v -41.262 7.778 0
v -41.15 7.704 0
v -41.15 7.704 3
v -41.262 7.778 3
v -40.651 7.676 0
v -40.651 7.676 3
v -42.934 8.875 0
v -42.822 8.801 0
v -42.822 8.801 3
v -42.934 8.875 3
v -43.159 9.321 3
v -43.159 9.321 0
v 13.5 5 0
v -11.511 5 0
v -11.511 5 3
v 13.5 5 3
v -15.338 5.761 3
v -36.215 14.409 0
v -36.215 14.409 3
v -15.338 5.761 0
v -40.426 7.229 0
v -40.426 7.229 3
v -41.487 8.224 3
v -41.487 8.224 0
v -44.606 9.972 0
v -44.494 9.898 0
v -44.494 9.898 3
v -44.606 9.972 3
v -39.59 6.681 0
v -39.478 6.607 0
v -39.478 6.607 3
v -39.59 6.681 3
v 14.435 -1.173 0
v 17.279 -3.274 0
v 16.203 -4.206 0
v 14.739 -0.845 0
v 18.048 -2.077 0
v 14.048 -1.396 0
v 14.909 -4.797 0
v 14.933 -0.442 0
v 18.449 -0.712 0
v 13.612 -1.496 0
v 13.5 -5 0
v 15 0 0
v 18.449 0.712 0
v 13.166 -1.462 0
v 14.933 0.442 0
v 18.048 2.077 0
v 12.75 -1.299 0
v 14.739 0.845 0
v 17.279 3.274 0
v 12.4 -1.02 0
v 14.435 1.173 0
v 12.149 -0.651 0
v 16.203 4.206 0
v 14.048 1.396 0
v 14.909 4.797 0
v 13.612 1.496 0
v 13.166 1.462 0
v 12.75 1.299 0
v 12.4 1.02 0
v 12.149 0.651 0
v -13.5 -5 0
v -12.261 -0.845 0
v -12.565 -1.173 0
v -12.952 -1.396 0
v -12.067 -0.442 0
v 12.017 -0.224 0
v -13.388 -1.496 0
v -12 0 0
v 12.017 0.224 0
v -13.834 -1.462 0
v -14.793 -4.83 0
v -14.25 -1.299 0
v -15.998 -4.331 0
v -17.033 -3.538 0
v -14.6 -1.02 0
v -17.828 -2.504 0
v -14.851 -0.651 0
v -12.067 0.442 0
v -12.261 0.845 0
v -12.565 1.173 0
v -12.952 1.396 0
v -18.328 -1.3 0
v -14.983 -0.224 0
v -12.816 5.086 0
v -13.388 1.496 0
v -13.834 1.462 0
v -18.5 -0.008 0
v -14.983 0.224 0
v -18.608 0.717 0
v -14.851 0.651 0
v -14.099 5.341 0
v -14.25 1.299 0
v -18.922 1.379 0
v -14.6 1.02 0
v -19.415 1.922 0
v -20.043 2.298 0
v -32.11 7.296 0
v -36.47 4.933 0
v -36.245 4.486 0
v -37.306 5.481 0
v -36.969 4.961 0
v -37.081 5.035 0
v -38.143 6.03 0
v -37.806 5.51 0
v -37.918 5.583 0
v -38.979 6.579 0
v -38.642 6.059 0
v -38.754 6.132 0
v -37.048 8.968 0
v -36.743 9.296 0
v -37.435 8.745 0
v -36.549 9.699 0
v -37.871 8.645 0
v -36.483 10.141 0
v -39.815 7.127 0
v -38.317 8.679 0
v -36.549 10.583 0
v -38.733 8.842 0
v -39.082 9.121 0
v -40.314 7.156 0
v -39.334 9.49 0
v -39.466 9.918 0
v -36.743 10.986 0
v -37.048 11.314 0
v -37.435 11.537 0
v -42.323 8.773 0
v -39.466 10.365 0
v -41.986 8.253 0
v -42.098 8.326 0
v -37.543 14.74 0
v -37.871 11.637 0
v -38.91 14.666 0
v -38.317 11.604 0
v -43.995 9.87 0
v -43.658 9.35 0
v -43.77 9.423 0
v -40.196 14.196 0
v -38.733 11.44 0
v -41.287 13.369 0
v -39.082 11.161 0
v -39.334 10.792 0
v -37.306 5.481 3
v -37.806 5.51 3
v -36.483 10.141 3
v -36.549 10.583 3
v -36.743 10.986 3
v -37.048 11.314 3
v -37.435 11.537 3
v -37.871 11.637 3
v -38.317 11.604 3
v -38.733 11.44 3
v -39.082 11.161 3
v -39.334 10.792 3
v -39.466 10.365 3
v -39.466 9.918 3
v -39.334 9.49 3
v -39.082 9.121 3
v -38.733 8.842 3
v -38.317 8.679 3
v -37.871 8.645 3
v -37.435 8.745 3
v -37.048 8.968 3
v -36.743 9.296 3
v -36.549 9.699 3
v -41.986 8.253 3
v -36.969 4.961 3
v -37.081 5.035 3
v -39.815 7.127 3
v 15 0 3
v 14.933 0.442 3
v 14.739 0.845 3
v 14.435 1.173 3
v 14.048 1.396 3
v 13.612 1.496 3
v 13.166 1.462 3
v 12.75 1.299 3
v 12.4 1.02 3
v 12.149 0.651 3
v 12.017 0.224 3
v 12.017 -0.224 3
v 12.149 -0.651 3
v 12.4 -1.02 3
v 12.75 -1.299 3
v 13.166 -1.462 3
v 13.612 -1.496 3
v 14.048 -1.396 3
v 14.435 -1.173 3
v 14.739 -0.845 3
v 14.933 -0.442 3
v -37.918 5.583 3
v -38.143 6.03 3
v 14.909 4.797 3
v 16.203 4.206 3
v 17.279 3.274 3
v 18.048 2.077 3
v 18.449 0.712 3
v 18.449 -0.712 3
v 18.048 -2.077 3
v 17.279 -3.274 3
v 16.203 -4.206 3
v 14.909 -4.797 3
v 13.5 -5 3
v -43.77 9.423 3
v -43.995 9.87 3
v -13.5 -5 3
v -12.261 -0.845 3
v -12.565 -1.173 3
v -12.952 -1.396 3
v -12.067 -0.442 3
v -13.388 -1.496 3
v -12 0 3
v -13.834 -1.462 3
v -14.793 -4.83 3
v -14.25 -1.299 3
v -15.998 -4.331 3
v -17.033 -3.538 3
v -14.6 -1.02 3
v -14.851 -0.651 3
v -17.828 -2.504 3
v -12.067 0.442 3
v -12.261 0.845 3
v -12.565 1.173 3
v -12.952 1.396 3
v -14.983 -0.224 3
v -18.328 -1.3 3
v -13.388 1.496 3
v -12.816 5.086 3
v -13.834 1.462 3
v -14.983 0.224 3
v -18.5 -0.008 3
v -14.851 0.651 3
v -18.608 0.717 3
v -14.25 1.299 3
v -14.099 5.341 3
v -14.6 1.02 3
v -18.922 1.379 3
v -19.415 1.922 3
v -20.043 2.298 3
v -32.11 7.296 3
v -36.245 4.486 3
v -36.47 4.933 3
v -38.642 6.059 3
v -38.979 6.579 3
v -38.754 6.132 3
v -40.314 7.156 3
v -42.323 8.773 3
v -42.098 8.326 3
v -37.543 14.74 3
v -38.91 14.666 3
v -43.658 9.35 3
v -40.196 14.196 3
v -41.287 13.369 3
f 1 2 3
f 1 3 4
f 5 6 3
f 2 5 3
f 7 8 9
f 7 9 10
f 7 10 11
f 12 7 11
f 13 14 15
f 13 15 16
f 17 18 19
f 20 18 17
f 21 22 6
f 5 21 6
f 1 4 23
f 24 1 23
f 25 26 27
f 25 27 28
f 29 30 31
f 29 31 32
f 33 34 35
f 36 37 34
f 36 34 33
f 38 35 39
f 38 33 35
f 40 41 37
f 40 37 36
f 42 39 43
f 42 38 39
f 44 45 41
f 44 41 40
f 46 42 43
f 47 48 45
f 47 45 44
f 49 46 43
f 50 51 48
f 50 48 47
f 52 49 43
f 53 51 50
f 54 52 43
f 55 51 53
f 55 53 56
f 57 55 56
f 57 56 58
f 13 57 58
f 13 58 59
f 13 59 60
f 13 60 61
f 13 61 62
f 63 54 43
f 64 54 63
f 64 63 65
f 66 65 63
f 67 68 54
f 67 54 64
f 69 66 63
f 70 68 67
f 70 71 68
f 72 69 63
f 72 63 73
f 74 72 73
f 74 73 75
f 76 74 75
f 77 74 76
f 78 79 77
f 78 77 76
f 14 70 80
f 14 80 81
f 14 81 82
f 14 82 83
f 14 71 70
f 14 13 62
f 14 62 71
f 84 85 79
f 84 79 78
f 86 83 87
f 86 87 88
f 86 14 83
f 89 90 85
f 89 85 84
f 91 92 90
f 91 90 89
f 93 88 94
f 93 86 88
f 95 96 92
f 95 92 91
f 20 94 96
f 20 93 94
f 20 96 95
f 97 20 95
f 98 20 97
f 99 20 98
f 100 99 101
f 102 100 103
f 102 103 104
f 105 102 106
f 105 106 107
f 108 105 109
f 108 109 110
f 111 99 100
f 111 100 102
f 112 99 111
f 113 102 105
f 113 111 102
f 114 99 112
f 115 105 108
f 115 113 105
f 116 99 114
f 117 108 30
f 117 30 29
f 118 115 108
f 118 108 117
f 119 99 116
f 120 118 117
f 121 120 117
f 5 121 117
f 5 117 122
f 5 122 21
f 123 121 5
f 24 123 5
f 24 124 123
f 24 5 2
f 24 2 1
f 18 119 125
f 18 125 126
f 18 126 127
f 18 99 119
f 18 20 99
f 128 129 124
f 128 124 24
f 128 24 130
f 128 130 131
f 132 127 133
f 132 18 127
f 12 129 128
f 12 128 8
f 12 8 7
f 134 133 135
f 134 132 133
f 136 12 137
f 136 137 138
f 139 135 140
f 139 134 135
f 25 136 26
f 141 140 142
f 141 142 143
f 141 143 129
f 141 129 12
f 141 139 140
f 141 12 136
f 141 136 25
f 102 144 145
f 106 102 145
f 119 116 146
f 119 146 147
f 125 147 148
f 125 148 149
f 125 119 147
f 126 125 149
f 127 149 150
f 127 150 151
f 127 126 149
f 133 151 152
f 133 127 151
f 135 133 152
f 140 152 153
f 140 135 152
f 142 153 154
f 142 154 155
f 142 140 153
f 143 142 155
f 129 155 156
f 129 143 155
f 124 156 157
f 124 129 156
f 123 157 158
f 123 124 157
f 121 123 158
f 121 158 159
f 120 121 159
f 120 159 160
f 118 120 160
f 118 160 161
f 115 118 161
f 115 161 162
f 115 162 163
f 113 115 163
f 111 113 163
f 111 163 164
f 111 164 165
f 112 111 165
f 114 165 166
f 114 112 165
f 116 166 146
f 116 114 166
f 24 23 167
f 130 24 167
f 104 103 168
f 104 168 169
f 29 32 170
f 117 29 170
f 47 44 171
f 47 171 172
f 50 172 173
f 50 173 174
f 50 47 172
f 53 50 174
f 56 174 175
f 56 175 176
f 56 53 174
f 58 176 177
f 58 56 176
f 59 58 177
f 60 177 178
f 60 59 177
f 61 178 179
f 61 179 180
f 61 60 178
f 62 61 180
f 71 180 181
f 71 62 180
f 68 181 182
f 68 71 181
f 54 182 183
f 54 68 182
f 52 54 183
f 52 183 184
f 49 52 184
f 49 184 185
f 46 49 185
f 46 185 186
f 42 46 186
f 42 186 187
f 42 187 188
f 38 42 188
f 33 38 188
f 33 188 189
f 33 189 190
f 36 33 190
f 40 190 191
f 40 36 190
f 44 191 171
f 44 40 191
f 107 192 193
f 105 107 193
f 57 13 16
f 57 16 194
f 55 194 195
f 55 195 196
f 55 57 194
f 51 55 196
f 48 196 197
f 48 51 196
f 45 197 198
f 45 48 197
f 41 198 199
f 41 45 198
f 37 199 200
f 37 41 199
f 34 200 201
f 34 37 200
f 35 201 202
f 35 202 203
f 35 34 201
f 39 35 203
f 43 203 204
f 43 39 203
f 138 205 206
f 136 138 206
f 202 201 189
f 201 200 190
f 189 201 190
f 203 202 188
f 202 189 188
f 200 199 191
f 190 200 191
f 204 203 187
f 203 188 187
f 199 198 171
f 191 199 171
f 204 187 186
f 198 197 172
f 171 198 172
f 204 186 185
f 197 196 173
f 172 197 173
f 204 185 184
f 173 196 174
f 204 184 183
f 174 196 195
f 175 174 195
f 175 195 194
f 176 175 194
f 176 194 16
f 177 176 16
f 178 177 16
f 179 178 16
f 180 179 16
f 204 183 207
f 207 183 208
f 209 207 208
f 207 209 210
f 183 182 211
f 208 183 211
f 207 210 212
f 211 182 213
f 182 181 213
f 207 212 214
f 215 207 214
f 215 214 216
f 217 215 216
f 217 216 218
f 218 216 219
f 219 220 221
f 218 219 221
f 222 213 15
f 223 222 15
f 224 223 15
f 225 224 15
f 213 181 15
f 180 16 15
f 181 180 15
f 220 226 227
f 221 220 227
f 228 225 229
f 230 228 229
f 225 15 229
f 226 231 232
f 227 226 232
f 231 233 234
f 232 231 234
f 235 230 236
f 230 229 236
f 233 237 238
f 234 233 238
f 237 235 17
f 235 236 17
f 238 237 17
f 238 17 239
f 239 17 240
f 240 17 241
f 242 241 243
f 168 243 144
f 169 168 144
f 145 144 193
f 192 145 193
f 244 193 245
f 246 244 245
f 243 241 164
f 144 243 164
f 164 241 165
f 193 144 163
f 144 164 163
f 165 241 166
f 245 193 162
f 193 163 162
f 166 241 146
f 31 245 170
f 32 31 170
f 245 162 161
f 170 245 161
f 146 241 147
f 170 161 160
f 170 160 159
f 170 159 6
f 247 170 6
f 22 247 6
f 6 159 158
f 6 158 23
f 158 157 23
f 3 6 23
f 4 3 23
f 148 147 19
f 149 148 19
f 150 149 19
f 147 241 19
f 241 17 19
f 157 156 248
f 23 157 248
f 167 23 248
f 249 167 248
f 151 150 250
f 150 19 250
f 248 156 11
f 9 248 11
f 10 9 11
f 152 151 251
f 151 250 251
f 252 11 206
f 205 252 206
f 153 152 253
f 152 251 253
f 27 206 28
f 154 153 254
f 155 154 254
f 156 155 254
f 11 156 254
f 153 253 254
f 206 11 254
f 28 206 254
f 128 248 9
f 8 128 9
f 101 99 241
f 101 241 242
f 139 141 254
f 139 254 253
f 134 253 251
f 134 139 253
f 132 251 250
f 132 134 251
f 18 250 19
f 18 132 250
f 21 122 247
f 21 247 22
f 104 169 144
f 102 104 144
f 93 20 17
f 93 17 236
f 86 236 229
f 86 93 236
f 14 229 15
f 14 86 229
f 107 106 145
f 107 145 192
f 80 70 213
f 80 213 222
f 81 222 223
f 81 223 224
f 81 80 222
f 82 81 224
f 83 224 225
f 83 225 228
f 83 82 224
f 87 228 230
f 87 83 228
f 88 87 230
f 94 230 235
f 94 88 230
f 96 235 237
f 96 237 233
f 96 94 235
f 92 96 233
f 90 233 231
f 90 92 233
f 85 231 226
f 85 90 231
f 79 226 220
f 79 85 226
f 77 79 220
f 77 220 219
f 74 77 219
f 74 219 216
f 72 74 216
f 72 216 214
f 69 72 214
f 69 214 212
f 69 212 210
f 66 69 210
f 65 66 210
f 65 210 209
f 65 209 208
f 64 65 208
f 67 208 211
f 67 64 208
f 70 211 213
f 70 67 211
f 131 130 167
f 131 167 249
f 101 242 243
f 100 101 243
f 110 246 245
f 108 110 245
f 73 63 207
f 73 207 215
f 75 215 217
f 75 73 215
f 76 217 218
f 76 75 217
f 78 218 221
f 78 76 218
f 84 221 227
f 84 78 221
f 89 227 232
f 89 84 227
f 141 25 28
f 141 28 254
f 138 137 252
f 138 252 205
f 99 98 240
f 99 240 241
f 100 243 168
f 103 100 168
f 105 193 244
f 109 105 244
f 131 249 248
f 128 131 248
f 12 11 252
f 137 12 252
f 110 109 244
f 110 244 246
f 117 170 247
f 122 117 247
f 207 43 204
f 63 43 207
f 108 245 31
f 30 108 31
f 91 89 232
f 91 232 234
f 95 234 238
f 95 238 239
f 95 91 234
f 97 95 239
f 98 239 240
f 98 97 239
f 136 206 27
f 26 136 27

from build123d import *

# Parameters (mm, degrees)
SKETCH1_R            = 1.5
BOSS_EXTRUDE1_DEPTH  = 3
CUT_EXTRUDE1_DEPTH   = 23
LPATTERN1_COUNT      = 2
LPATTERN1_PITCH      = 10
LPATTERN1_COUNT_DIR2 = 10
LPATTERN1_PITCH_DIR2 = 1


with BuildPart() as part:
    # Sketch1 → Boss-Extrude1 (new body)
    with BuildSketch(Plane.XY):
        with BuildLine():
            Line((-11.510876326, 5), (13.5, 5))
            ThreePointArc((13.5, 5), (18.5, 0), (13.5, -5))
            Line((13.5, -5), (-13.5, -5))
            ThreePointArc((-13.5, -5), (-17.032859244, -3.538206546), (-18.499994281, -0.007562225))
            ThreePointArc((-18.499994281, -0.007562225), (-18.922368323, 1.379153788), (-20.043282841, 2.298355494))
            Line((-20.043282841, 2.298355494), (-32.109838269, 7.296486403))
            Line((-32.109838269, 7.296486403), (-36.245393033, 4.48629303))
            Line((-36.245393033, 4.48629303), (-44.606456533, 9.97196684))
            Line((-44.606456533, 9.97196684), (-41.286860538, 13.369433901))
            ThreePointArc((-41.286860538, 13.369433901), (-38.910252818, 14.666448531), (-36.215040659, 14.408877911))
            Line((-36.215040659, 14.408877911), (-15.33771065, 5.761204675))
            ThreePointArc((-15.33771065, 5.761204675), (-13.461779546, 5.192147196), (-11.510876326, 5))
        make_face()
        with Locations((-13.5, 0)):
            Circle(SKETCH1_R, mode=Mode.SUBTRACT)
        with Locations((13.5, 0)):
            Circle(SKETCH1_R, mode=Mode.SUBTRACT)
        with Locations((-37.982807612, 10.141110958)):
            Circle(SKETCH1_R, mode=Mode.SUBTRACT)
    extrude(amount=BOSS_EXTRUDE1_DEPTH)

    # Sketch3 → Cut-Extrude1 (cut)
    with BuildSketch(Plane.XY.offset(3)):
        Polygon((-36.470295857, 4.932856261), (-36.969482372, 4.961366317), (-36.245393033, 4.48629303), align=None)
    cut_extrude1 = extrude(amount=-CUT_EXTRUDE1_DEPTH, mode=Mode.SUBTRACT)

    # LPattern1: Cut-Extrude1 2 × 10
    with Locations(*[Vector(-0.8361063499961565, 0.5485673809990023, 0) * (i * LPATTERN1_PITCH) + Vector(0.8361063499961561, -0.548567380999003, 0) * (j * LPATTERN1_PITCH_DIR2) for i in range(LPATTERN1_COUNT) for j in range(LPATTERN1_COUNT_DIR2) if (i, j) != (0, 0)]):
        add(cut_extrude1, mode=Mode.SUBTRACT)


solid = part.part
